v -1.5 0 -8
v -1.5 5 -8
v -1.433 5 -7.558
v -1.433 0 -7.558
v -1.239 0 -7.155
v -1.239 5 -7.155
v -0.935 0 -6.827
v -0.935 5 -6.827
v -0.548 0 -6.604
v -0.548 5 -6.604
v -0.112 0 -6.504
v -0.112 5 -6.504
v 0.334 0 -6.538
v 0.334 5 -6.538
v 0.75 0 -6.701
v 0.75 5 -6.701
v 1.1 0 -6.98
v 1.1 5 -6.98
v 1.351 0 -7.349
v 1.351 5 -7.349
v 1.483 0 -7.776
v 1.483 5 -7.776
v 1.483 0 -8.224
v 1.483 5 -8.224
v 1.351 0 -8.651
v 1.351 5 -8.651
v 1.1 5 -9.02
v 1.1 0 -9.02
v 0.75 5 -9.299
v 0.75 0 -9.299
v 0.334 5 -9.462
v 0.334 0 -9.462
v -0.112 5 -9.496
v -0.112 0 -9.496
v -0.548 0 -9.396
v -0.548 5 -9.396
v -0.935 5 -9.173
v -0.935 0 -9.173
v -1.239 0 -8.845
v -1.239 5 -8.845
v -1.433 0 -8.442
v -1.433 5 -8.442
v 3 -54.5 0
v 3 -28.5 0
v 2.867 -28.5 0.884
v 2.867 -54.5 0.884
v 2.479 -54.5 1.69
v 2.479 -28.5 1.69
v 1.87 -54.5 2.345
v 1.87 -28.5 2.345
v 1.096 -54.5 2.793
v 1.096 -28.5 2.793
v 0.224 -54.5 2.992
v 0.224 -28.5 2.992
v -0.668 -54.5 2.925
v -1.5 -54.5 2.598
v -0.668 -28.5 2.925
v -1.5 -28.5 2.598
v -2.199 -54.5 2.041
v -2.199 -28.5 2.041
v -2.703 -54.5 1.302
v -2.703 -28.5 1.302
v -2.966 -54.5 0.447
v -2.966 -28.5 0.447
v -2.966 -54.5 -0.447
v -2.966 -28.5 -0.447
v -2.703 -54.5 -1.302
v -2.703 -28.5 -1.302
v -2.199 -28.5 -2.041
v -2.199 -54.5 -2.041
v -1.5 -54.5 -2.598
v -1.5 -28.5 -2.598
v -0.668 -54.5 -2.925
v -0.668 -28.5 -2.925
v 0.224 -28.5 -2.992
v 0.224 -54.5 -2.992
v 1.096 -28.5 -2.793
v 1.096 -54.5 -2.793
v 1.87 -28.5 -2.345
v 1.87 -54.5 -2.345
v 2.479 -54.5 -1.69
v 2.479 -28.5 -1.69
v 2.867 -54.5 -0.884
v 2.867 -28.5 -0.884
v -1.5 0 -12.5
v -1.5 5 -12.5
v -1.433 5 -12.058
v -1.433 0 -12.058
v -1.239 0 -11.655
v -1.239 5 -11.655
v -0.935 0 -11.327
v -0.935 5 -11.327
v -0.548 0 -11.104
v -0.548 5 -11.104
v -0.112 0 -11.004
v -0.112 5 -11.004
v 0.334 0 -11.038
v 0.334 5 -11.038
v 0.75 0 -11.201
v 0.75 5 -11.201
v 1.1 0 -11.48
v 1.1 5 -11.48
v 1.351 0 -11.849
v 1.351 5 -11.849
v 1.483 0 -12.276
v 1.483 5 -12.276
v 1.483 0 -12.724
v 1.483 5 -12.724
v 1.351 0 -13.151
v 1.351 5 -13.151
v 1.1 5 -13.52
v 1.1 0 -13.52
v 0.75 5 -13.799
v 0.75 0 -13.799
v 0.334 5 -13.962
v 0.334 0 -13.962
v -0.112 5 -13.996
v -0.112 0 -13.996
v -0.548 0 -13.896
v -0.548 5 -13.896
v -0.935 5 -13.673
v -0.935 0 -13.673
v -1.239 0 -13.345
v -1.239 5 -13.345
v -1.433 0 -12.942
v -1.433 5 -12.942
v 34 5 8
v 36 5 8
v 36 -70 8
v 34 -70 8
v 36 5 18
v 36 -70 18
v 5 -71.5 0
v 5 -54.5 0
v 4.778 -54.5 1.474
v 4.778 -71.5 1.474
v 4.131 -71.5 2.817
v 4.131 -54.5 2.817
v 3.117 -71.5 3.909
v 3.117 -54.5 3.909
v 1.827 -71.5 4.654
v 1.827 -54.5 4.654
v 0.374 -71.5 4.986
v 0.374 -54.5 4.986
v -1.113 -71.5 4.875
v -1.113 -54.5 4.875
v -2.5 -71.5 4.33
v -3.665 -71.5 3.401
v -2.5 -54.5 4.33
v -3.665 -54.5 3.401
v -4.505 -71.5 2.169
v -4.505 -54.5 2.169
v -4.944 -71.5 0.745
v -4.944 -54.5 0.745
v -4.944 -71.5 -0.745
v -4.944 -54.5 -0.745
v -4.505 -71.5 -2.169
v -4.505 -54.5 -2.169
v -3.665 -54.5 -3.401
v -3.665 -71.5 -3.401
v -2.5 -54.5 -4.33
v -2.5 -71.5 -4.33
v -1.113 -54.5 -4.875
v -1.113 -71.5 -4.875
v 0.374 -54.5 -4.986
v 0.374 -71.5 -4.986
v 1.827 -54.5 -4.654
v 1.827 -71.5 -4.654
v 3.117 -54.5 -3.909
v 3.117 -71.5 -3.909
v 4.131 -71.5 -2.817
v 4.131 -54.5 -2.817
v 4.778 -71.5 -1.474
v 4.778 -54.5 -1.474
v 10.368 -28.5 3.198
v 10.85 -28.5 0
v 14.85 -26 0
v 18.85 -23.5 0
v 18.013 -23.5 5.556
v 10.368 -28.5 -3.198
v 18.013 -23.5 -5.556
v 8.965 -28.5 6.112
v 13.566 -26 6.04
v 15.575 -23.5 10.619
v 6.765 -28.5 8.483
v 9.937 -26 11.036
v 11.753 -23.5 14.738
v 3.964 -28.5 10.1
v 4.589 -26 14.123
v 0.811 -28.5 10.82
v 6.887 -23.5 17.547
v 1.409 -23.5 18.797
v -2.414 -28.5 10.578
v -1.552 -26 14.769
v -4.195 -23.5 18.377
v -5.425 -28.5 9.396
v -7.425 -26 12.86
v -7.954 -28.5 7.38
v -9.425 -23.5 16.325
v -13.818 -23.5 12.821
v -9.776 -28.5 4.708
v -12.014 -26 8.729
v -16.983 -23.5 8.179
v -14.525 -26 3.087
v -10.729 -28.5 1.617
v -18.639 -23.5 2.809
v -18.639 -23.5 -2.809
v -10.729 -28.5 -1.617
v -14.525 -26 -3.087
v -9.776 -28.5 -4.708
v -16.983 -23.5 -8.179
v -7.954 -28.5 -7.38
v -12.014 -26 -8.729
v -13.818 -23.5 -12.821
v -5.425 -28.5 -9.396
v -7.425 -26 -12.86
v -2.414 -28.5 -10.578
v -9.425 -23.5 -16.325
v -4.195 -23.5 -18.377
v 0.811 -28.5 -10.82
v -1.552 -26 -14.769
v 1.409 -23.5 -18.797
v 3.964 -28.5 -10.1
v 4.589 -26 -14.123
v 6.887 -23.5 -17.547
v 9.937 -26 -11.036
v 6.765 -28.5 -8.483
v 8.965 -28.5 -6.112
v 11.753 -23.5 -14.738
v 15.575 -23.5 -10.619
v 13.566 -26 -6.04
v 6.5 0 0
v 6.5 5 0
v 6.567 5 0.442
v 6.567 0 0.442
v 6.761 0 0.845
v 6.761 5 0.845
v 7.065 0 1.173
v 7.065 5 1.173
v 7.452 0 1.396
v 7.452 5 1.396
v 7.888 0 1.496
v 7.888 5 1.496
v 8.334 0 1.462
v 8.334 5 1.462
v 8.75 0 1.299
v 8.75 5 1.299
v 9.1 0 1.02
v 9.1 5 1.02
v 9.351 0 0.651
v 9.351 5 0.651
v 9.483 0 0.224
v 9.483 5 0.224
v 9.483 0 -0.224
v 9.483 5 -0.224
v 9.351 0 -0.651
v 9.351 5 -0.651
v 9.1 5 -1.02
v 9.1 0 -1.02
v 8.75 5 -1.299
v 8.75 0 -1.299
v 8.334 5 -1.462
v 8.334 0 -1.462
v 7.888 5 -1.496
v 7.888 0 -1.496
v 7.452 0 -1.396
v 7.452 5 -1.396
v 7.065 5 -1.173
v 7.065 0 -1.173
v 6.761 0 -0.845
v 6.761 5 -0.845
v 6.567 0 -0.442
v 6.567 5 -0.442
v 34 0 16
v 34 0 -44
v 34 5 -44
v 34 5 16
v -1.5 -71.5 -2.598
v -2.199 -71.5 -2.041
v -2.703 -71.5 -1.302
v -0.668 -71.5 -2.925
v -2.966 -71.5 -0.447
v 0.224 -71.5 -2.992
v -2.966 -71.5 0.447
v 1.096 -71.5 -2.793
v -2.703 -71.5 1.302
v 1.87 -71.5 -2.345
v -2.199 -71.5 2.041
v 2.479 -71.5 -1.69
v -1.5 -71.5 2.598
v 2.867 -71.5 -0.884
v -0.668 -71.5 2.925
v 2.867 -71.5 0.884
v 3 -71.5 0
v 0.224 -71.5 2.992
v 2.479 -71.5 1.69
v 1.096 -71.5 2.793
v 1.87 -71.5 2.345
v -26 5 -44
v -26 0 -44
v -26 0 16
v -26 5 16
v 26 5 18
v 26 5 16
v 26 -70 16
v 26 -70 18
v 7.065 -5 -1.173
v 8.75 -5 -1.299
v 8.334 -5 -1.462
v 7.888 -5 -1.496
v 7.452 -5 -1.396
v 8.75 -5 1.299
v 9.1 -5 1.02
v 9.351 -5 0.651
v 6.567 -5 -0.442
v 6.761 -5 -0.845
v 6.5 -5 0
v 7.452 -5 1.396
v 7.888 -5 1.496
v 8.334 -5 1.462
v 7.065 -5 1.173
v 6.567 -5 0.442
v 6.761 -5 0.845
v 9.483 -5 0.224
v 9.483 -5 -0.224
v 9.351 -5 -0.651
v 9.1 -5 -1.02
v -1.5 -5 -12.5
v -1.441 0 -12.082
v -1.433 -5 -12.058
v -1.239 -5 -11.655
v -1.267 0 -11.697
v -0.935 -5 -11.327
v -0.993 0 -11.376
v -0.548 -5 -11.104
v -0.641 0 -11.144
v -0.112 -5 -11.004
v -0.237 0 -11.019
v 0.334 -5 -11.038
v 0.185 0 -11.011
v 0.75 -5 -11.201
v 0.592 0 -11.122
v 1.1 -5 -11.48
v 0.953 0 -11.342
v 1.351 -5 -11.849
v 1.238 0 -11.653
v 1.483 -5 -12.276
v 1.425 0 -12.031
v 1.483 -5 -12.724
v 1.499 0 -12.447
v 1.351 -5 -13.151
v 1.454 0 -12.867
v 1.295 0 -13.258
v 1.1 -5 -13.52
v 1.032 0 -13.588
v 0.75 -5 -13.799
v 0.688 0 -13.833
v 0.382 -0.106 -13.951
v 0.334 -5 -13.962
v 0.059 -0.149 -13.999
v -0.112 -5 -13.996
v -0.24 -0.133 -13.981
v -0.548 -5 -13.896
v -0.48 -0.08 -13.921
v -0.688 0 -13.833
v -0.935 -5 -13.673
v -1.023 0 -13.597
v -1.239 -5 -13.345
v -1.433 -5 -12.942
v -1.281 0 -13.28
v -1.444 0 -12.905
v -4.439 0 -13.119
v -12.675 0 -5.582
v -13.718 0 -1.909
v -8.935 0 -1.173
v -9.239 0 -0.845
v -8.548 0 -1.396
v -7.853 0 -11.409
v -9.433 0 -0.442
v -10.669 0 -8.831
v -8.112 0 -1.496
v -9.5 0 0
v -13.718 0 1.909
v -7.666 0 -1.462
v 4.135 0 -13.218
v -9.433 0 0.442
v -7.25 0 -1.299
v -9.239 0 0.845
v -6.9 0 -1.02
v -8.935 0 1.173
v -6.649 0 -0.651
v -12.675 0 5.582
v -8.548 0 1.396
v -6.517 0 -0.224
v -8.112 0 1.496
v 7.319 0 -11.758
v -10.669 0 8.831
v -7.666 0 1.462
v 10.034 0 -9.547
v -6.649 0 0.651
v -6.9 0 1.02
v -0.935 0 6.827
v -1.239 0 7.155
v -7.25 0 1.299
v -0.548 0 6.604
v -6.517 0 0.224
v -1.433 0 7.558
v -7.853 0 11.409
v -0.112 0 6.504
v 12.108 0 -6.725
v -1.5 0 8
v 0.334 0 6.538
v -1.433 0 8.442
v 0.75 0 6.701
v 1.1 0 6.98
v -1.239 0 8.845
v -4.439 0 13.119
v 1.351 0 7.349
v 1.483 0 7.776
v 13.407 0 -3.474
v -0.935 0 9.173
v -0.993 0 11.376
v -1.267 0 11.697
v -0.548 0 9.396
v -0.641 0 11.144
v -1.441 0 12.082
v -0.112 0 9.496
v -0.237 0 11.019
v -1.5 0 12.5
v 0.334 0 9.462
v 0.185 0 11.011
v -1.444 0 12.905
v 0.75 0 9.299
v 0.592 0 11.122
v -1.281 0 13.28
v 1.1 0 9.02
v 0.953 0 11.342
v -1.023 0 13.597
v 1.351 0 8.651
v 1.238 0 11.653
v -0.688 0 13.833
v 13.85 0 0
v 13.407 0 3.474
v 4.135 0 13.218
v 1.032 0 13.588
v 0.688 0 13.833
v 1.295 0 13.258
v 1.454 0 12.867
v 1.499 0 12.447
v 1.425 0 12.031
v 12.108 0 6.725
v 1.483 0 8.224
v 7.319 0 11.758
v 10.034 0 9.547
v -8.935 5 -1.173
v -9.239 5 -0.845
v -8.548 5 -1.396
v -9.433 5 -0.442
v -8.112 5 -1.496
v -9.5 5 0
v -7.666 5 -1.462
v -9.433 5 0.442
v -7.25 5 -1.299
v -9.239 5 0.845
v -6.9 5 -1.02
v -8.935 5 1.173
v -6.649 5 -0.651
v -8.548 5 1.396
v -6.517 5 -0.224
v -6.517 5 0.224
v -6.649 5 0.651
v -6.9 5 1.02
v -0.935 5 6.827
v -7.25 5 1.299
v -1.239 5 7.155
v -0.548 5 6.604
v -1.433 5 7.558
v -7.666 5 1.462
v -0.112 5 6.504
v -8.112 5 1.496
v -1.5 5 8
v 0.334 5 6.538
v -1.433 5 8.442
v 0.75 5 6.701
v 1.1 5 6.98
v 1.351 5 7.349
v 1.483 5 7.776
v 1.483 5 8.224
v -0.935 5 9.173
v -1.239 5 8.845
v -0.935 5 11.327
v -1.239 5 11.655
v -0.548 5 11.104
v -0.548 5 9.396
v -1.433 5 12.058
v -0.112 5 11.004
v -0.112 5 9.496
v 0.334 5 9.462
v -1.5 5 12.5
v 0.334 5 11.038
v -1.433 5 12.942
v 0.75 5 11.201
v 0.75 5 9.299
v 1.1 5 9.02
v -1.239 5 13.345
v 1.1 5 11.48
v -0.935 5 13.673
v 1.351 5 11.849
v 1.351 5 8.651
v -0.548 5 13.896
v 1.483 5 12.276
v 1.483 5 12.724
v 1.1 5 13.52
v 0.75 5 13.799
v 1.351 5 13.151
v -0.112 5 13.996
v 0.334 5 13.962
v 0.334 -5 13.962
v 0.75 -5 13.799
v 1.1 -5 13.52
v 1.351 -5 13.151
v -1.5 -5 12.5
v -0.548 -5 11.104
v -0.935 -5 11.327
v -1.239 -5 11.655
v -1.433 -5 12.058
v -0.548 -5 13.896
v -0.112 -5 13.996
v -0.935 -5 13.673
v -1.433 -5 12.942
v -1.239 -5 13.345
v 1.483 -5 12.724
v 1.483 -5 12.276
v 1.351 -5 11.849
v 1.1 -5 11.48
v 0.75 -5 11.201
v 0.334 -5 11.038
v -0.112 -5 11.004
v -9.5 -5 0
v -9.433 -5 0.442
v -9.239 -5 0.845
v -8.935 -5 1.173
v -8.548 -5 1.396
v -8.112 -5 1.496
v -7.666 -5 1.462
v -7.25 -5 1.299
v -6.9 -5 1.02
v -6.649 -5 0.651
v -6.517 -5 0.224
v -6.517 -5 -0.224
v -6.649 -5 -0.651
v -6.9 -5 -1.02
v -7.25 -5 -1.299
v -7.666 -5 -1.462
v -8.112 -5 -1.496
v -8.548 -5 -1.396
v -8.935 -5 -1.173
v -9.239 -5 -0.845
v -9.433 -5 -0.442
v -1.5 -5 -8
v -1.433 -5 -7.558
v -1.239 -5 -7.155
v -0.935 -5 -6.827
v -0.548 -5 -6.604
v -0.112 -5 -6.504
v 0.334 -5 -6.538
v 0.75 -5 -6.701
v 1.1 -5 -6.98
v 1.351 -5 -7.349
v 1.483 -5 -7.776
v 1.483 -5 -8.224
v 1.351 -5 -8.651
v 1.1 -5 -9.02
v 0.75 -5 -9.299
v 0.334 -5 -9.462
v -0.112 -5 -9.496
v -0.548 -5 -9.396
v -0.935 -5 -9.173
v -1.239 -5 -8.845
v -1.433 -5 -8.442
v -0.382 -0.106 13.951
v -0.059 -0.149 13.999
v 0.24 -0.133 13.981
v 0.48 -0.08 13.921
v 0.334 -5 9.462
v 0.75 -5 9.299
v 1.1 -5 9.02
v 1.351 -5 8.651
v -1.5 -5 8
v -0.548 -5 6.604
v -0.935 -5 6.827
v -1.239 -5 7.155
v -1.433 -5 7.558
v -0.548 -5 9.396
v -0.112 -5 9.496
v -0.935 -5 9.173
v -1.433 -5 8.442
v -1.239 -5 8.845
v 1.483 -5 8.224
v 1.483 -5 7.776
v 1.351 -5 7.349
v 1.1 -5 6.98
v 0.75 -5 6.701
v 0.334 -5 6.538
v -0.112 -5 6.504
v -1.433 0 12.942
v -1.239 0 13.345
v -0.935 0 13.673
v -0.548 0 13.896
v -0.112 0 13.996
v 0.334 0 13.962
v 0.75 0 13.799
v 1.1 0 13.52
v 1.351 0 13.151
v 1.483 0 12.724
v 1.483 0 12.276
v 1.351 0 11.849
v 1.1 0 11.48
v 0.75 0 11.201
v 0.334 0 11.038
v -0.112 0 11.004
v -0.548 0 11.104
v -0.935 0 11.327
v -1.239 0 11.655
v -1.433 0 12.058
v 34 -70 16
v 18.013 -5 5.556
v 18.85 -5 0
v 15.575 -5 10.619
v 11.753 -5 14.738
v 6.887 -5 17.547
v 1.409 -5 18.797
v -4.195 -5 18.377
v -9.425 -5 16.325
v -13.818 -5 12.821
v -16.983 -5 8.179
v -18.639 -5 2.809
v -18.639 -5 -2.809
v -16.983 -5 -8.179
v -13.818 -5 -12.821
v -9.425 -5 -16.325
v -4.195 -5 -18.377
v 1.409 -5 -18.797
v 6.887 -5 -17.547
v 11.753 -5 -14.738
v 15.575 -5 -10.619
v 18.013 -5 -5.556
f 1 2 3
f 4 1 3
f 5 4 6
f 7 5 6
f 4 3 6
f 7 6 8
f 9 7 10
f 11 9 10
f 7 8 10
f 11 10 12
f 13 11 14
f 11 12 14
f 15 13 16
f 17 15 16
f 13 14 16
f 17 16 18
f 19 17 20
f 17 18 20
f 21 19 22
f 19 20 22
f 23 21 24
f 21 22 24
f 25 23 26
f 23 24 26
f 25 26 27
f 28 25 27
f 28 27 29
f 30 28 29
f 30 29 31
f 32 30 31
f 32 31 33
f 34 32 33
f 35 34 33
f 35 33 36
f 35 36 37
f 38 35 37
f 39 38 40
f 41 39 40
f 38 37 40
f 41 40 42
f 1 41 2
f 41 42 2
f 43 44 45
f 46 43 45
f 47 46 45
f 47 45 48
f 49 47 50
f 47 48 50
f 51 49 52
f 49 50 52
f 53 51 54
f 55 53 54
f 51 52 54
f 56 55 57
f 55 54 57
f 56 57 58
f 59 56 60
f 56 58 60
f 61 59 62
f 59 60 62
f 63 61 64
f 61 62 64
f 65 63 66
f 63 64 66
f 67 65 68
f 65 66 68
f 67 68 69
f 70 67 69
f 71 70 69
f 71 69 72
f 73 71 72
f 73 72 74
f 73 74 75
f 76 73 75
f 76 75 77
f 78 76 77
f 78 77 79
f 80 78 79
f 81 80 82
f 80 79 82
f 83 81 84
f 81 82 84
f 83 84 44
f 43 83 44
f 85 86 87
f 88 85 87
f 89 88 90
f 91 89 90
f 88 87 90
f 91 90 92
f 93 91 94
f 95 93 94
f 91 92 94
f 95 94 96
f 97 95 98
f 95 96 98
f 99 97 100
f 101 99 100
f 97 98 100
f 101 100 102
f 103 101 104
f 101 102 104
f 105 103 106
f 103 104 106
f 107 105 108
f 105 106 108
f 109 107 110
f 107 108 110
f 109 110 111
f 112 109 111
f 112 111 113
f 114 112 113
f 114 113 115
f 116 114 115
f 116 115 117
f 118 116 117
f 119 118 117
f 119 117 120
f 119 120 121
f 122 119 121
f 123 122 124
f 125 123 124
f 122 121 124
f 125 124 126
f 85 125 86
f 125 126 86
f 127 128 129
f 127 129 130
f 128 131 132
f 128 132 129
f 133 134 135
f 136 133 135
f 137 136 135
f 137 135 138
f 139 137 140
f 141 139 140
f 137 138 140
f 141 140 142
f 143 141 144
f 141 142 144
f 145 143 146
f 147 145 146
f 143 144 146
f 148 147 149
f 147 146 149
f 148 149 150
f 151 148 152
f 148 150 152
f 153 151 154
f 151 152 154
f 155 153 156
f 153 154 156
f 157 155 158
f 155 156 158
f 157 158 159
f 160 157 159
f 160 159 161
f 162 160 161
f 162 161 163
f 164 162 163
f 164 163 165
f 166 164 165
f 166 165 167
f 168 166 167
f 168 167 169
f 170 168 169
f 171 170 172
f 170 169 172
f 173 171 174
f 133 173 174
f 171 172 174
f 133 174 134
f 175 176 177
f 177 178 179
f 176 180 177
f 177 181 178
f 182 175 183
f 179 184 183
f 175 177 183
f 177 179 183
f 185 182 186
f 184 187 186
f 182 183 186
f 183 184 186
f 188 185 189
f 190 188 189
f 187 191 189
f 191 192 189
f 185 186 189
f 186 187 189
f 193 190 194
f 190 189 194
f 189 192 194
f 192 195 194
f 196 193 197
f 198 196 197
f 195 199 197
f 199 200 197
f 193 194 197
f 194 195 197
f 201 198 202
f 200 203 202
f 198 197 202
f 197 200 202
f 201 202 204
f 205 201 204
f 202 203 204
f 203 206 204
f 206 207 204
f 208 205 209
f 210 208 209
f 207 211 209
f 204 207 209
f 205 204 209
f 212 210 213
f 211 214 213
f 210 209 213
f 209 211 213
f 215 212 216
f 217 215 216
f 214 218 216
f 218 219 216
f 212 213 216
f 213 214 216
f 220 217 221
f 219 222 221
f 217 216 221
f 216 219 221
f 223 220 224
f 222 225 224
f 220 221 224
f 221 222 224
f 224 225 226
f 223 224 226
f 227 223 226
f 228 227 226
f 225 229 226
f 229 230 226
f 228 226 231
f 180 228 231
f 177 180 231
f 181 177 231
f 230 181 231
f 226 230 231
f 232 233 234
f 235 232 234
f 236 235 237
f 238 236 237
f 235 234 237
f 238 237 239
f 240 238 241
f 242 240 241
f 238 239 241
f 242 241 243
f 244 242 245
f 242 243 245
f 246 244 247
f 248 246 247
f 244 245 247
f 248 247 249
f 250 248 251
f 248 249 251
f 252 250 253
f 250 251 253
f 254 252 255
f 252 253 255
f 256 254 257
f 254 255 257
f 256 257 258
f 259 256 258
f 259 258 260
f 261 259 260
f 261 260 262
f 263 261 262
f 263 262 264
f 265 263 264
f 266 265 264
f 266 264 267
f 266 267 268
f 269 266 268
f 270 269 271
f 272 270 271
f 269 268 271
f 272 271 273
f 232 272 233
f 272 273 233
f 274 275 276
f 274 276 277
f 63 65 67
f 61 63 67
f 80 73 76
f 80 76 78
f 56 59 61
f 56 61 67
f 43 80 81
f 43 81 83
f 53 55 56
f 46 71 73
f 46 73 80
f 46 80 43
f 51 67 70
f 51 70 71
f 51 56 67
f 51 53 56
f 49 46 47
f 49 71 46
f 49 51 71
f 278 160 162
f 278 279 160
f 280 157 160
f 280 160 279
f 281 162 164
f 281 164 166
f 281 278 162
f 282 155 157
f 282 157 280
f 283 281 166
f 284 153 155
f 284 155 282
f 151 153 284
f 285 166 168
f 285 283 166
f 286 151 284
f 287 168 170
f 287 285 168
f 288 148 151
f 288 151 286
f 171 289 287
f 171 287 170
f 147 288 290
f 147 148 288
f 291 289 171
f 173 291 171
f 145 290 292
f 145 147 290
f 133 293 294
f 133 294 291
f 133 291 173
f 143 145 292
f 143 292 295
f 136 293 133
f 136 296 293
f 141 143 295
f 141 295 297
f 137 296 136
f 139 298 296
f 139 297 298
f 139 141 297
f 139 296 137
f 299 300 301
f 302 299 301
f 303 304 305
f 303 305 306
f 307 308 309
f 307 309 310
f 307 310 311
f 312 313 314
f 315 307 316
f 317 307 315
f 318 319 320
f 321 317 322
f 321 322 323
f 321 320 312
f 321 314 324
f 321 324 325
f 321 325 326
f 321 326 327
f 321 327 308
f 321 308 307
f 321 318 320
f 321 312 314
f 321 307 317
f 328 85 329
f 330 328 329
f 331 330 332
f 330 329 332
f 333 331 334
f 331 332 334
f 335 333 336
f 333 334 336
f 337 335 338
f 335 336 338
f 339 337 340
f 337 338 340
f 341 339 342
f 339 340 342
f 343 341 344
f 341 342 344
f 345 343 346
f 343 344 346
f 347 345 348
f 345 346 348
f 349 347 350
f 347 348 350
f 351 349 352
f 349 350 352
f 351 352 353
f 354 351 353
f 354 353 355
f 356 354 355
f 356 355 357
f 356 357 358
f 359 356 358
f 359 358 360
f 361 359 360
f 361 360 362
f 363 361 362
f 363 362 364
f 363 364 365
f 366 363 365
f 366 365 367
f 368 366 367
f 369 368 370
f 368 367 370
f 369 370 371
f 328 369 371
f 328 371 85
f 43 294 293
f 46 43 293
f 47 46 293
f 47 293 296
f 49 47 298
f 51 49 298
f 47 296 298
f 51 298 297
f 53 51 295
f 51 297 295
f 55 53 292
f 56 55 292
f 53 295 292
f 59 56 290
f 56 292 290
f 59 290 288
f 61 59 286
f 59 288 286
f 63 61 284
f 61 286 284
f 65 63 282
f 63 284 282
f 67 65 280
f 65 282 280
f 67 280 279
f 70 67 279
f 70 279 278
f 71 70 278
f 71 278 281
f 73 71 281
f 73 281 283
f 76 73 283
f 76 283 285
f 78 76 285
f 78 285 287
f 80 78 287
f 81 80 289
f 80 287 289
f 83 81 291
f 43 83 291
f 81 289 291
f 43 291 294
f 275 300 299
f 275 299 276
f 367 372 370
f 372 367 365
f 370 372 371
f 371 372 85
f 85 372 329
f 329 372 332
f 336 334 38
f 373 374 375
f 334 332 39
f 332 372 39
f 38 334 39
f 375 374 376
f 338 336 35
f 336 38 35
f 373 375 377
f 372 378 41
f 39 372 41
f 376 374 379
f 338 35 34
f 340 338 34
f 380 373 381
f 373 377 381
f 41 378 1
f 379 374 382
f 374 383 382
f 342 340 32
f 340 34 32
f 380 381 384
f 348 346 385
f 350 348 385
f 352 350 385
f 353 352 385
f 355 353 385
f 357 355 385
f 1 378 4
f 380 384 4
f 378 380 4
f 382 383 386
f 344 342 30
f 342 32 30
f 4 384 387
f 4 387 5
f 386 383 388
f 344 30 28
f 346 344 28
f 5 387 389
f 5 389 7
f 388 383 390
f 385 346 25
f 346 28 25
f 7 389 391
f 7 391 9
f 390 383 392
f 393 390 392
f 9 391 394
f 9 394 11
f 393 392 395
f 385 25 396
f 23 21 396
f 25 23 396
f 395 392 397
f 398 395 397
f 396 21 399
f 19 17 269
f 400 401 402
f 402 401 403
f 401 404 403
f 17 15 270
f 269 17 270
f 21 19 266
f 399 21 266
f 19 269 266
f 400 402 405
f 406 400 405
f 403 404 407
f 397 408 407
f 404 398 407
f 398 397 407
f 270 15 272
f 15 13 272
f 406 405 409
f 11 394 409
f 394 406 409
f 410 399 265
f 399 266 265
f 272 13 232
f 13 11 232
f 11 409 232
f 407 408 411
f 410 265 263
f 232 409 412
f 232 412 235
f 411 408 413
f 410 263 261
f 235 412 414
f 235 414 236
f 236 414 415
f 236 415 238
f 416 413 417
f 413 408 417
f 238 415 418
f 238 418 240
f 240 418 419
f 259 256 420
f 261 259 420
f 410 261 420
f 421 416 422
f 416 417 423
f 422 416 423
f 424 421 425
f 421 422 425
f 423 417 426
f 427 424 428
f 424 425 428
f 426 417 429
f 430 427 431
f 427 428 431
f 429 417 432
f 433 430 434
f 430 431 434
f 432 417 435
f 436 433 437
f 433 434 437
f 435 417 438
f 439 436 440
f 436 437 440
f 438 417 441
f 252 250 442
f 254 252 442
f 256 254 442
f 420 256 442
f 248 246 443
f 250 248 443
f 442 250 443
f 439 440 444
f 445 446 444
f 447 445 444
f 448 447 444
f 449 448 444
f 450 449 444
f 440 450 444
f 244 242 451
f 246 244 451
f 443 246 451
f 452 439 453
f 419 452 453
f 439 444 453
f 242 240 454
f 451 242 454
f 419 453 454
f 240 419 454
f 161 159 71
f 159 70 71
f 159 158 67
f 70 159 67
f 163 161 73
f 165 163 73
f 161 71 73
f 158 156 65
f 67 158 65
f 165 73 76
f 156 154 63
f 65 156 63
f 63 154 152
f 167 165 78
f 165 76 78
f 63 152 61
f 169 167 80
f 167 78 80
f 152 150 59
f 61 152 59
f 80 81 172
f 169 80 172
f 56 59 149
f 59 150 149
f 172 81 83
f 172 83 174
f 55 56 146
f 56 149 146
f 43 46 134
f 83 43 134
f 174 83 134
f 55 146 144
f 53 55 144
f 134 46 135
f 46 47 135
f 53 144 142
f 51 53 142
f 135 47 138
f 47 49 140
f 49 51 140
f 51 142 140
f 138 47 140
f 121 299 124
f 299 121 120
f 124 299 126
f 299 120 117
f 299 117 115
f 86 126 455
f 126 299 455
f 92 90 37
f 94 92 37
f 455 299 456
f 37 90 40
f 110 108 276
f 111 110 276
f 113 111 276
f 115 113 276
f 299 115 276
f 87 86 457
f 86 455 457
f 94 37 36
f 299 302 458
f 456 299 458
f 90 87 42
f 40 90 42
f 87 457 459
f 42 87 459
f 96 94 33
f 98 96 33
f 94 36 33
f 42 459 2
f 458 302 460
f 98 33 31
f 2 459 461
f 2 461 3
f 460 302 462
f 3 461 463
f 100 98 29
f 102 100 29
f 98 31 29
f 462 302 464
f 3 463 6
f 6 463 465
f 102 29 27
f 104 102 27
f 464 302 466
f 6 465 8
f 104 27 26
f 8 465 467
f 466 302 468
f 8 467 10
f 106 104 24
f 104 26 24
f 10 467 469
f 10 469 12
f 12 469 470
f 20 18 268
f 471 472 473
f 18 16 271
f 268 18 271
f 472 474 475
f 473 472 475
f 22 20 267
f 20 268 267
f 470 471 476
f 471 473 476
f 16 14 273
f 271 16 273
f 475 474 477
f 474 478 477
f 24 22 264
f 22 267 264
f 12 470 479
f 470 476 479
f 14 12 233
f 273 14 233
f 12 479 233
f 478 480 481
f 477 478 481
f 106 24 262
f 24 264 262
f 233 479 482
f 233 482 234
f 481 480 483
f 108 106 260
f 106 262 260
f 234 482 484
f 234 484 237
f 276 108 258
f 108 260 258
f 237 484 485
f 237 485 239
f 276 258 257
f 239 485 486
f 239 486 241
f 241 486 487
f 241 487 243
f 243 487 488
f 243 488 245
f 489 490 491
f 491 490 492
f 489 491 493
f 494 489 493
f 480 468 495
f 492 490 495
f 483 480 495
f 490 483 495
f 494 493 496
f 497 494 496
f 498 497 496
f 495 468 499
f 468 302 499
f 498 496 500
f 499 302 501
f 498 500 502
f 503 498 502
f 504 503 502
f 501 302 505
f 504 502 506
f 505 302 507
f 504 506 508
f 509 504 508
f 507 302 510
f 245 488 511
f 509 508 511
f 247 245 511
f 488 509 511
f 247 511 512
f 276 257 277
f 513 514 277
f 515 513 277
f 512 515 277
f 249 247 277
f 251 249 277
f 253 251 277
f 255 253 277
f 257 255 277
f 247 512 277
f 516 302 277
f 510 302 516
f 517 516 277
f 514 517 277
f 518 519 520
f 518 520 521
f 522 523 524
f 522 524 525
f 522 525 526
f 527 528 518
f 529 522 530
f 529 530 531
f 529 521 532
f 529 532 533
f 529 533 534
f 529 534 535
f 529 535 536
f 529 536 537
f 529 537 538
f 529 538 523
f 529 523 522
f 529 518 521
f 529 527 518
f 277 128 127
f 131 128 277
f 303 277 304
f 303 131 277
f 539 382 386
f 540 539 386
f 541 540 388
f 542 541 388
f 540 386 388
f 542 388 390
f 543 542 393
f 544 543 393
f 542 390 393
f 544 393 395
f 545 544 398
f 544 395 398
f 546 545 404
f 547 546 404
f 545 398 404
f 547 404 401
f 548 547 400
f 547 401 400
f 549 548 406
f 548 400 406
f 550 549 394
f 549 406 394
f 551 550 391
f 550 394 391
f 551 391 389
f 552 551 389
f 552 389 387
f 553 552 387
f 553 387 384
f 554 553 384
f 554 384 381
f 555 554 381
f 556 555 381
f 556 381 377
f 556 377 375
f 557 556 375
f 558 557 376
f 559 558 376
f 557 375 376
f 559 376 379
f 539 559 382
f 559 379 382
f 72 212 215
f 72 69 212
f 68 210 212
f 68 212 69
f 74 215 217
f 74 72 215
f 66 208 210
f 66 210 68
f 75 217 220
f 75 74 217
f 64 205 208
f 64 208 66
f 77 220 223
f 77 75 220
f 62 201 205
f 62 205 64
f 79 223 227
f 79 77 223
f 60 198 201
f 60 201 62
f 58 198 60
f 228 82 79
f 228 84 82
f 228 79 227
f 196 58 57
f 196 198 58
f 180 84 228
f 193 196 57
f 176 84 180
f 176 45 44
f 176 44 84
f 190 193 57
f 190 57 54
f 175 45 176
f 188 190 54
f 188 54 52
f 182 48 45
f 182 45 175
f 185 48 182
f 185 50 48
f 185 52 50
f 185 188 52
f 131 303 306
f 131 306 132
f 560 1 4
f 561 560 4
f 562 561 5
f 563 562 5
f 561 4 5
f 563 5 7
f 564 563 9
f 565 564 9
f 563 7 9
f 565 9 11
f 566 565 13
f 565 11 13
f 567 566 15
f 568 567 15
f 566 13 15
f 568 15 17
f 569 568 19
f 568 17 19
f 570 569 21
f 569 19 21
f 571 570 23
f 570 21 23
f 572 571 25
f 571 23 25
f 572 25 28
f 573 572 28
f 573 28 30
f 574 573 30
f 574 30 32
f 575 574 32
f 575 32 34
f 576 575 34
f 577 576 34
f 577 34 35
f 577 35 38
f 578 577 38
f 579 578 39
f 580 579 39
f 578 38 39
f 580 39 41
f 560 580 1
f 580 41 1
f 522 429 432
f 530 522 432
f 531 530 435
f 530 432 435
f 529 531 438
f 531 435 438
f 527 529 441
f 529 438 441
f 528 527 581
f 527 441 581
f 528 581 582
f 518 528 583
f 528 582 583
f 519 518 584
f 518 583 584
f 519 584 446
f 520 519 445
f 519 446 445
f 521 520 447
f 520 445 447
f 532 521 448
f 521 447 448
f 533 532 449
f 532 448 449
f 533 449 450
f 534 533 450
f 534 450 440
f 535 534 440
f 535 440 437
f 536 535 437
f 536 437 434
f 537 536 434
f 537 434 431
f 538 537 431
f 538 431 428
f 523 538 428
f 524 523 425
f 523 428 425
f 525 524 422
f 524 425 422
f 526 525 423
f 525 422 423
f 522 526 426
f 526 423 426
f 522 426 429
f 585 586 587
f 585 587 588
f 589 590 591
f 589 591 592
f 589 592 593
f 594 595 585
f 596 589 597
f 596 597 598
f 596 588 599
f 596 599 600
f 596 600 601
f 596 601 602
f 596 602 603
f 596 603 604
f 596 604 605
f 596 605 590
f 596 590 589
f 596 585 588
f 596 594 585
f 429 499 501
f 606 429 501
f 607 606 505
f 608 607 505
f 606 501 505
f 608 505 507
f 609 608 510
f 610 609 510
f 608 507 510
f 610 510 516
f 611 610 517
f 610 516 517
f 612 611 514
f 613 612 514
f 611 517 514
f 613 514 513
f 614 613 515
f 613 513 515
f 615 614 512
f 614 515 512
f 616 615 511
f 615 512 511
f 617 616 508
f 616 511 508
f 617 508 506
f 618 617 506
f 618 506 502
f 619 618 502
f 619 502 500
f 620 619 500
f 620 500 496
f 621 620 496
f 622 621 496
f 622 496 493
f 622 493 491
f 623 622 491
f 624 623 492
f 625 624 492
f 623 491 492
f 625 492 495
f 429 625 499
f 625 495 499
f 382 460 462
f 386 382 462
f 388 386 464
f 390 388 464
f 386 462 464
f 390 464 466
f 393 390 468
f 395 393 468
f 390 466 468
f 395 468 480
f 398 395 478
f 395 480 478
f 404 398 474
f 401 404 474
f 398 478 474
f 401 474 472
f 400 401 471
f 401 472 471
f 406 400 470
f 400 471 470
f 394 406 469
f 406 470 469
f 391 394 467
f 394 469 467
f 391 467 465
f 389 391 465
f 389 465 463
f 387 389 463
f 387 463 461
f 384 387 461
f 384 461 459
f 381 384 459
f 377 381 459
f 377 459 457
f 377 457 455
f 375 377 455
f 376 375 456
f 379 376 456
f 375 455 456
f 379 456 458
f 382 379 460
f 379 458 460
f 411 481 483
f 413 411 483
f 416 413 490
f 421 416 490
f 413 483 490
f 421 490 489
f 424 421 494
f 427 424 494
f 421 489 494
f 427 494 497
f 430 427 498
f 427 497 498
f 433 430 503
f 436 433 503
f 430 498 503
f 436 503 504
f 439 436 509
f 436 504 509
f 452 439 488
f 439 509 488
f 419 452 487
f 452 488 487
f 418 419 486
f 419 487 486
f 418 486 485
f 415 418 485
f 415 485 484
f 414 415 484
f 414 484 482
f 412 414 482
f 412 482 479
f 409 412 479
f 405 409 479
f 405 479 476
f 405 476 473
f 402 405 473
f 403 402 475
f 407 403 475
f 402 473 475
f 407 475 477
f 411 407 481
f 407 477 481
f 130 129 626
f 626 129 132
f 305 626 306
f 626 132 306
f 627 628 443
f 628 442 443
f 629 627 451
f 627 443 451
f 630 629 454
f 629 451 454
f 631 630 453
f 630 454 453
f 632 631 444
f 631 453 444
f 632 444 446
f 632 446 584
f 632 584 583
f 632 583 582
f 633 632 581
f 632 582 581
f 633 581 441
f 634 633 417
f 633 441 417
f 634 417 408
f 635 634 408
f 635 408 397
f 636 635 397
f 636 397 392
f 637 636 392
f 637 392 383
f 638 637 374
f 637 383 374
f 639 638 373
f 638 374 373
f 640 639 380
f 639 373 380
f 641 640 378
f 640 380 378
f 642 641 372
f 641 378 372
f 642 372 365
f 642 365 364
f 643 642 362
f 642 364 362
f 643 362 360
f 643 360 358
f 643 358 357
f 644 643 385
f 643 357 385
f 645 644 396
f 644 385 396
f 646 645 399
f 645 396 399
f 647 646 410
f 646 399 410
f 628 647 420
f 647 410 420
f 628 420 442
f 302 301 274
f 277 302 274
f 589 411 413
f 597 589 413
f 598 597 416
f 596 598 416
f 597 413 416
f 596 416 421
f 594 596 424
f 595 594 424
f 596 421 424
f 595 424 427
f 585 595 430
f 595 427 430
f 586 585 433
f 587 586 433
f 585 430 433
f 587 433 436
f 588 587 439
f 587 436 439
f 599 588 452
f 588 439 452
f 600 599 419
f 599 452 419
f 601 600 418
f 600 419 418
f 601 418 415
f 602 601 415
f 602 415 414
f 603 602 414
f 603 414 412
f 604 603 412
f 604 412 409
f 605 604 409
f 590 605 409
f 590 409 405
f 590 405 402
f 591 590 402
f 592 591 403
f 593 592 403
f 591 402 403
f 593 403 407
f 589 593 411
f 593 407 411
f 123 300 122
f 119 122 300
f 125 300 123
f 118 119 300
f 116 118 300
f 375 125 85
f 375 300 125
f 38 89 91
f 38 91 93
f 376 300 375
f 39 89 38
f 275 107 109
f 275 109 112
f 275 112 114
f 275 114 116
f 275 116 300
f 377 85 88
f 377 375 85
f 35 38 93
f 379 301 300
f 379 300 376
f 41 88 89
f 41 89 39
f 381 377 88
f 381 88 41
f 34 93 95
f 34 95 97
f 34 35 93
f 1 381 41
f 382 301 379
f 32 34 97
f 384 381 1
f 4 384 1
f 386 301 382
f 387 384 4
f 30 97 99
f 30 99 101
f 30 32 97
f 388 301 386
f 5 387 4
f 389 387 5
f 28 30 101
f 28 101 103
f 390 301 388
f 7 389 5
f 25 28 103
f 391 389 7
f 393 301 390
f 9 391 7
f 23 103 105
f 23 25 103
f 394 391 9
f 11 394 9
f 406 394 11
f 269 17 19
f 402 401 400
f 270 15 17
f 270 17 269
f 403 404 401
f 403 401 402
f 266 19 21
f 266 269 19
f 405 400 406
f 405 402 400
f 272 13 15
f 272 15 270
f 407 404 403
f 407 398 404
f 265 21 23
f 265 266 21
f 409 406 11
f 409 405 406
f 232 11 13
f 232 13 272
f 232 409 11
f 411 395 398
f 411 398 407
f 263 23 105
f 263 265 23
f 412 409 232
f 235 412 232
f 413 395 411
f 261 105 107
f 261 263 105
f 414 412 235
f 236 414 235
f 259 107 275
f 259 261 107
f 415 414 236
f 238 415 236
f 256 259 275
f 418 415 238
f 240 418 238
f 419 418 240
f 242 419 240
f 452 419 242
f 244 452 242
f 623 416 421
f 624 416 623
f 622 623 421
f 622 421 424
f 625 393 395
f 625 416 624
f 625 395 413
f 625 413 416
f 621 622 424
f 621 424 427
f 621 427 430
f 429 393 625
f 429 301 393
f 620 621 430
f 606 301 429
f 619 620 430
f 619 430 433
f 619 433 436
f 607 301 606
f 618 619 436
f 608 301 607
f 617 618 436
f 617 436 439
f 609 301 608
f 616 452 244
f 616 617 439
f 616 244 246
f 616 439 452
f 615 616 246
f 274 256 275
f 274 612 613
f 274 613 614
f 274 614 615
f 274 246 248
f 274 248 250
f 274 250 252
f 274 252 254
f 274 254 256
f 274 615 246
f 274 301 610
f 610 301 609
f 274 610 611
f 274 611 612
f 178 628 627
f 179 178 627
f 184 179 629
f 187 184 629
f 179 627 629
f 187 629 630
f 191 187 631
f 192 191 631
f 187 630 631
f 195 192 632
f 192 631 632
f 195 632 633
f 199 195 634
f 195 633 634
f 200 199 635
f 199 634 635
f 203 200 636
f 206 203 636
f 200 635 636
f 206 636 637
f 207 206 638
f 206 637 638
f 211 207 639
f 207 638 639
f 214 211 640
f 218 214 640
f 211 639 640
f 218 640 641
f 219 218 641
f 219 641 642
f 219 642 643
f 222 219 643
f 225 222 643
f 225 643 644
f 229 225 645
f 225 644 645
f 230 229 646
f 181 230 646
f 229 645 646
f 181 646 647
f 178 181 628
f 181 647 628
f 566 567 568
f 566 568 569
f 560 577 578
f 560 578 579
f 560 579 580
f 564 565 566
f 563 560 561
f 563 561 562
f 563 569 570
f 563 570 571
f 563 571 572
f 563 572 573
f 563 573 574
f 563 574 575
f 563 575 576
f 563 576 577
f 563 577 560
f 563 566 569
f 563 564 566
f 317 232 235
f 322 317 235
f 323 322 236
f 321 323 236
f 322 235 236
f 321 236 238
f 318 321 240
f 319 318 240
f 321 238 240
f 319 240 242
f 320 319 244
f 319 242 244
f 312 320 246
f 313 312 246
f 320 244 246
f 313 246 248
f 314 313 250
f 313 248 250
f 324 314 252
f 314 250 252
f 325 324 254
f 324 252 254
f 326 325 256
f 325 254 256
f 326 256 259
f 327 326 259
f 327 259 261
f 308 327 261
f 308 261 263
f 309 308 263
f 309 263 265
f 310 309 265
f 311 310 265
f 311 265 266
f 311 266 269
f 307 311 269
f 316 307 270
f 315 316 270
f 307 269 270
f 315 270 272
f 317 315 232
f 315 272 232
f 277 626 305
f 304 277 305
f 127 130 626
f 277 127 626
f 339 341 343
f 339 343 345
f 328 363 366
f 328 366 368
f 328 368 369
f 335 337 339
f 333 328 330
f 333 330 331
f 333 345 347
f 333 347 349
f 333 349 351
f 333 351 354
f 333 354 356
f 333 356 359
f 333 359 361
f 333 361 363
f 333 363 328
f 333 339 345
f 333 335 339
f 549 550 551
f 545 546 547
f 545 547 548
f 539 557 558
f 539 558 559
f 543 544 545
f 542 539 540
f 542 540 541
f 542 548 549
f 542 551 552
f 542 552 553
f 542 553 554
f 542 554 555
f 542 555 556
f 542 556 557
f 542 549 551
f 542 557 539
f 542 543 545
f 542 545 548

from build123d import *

# Parameters (mm, degrees)
F0_R      = 18.85
F1_DEPTH  = 28.5
F2_SIZE2  = 5
F2_SIZE   = 8
F3_SIZE   = 5
F4_R      = 3
F5_DEPTH  = 26
F6_R      = 5
F7_DEPTH  = 17
F8_R      = 3
F9_DEPTH  = 17
F10_R     = 1.5
F11_DEPTH = 5
F12_W     = 60
F12_H     = 60
F13_DEPTH = 5
F14_R     = 1.5
F15_DEPTH = 5
F17_DEPTH = 75


with BuildPart() as f1:
    # F0 (on Front) → F1 (new body)
    with BuildSketch(Plane.XZ):
        Circle(F0_R)
    extrude(amount=F1_DEPTH)

    # F2
    f2_edges = [f1.edges().sort_by_distance(p)[0] for p in [
        (-18.85, -28.5, 0),
    ]]
    f2_side = f1.faces().sort_by_distance((0, -28.5, 0))[0]
    chamfer(f2_edges, length=F2_SIZE, length2=F2_SIZE2, reference=f2_side)

    # F3
    f3_edges = [f1.edges().sort_by_distance(p)[0] for p in [
        (-18.85, 0, 0),
    ]]
    chamfer(f3_edges, length=F3_SIZE)

    # F4 (on face) → F5 (join)
    with BuildSketch(Plane.XZ.offset(28.5)):
        Circle(F4_R)
    extrude(amount=F5_DEPTH)

    # F10 (on face) → F11 (cut)
    with BuildSketch(Plane(origin=(0, 0, 0), x_dir=(-1, 0, 0), z_dir=(0, 1, 0))):
        with Locations((0, 8)):
            Circle(F10_R)
        with Locations((0, 12.5)):
            Circle(F10_R)
        with Locations((0, -8)):
            Circle(F10_R)
        with Locations((0, -12.5)):
            Circle(F10_R)
        with Locations((-8, 0)):
            Circle(F10_R)
        with Locations((8, 0)):
            Circle(F10_R)
    extrude(amount=-F11_DEPTH, mode=Mode.SUBTRACT)


with BuildPart() as f7:
    # F6 (on face) → F7 (new body)
    with BuildSketch(Plane.XZ.offset(54.5)):
        Circle(F6_R)
    extrude(amount=F7_DEPTH)

    # F8 (on face) → F9 (cut, through all)
    with BuildSketch(Plane.XZ.offset(71.5)):
        Circle(F8_R)
    extrude(amount=-F9_DEPTH, mode=Mode.SUBTRACT)


with BuildPart() as f13:
    # F12 (on Front) → F13 (new body)
    with BuildSketch(Plane.XZ):
        with Locations((4, -14)):
            Rectangle(F12_W, F12_H)
    extrude(amount=-F13_DEPTH)

    # F14 (on face) → F15 (cut, through all)
    with BuildSketch(Plane(origin=(0, 5, 0), x_dir=(-1, 0, 0), z_dir=(0, 1, 0))):
        with Locations((-8, 0)):
            Circle(F14_R)
        with Locations((0, 8)):
            Circle(F14_R)
        with Locations((0, 12.5)):
            Circle(F14_R)
        with Locations((0, -8)):
            Circle(F14_R)
        with Locations((0, -12.5)):
            Circle(F14_R)
        with Locations((8, 0)):
            Circle(F14_R)
    extrude(amount=-F15_DEPTH, mode=Mode.SUBTRACT)


with BuildPart() as f17:
    # F16 (on face) → F17 (new body)
    with BuildSketch(Plane(origin=(0, 5, 0), x_dir=(-1, 0, 0), z_dir=(0, 1, 0))):
        Polygon((-34, 8), (-34, 16), (-26, 16), (-26, 18), (-36, 18), (-36, 8), align=None)
    extrude(amount=-F17_DEPTH)


solid = Compound([f1.part, f7.part, f13.part, f17.part])
